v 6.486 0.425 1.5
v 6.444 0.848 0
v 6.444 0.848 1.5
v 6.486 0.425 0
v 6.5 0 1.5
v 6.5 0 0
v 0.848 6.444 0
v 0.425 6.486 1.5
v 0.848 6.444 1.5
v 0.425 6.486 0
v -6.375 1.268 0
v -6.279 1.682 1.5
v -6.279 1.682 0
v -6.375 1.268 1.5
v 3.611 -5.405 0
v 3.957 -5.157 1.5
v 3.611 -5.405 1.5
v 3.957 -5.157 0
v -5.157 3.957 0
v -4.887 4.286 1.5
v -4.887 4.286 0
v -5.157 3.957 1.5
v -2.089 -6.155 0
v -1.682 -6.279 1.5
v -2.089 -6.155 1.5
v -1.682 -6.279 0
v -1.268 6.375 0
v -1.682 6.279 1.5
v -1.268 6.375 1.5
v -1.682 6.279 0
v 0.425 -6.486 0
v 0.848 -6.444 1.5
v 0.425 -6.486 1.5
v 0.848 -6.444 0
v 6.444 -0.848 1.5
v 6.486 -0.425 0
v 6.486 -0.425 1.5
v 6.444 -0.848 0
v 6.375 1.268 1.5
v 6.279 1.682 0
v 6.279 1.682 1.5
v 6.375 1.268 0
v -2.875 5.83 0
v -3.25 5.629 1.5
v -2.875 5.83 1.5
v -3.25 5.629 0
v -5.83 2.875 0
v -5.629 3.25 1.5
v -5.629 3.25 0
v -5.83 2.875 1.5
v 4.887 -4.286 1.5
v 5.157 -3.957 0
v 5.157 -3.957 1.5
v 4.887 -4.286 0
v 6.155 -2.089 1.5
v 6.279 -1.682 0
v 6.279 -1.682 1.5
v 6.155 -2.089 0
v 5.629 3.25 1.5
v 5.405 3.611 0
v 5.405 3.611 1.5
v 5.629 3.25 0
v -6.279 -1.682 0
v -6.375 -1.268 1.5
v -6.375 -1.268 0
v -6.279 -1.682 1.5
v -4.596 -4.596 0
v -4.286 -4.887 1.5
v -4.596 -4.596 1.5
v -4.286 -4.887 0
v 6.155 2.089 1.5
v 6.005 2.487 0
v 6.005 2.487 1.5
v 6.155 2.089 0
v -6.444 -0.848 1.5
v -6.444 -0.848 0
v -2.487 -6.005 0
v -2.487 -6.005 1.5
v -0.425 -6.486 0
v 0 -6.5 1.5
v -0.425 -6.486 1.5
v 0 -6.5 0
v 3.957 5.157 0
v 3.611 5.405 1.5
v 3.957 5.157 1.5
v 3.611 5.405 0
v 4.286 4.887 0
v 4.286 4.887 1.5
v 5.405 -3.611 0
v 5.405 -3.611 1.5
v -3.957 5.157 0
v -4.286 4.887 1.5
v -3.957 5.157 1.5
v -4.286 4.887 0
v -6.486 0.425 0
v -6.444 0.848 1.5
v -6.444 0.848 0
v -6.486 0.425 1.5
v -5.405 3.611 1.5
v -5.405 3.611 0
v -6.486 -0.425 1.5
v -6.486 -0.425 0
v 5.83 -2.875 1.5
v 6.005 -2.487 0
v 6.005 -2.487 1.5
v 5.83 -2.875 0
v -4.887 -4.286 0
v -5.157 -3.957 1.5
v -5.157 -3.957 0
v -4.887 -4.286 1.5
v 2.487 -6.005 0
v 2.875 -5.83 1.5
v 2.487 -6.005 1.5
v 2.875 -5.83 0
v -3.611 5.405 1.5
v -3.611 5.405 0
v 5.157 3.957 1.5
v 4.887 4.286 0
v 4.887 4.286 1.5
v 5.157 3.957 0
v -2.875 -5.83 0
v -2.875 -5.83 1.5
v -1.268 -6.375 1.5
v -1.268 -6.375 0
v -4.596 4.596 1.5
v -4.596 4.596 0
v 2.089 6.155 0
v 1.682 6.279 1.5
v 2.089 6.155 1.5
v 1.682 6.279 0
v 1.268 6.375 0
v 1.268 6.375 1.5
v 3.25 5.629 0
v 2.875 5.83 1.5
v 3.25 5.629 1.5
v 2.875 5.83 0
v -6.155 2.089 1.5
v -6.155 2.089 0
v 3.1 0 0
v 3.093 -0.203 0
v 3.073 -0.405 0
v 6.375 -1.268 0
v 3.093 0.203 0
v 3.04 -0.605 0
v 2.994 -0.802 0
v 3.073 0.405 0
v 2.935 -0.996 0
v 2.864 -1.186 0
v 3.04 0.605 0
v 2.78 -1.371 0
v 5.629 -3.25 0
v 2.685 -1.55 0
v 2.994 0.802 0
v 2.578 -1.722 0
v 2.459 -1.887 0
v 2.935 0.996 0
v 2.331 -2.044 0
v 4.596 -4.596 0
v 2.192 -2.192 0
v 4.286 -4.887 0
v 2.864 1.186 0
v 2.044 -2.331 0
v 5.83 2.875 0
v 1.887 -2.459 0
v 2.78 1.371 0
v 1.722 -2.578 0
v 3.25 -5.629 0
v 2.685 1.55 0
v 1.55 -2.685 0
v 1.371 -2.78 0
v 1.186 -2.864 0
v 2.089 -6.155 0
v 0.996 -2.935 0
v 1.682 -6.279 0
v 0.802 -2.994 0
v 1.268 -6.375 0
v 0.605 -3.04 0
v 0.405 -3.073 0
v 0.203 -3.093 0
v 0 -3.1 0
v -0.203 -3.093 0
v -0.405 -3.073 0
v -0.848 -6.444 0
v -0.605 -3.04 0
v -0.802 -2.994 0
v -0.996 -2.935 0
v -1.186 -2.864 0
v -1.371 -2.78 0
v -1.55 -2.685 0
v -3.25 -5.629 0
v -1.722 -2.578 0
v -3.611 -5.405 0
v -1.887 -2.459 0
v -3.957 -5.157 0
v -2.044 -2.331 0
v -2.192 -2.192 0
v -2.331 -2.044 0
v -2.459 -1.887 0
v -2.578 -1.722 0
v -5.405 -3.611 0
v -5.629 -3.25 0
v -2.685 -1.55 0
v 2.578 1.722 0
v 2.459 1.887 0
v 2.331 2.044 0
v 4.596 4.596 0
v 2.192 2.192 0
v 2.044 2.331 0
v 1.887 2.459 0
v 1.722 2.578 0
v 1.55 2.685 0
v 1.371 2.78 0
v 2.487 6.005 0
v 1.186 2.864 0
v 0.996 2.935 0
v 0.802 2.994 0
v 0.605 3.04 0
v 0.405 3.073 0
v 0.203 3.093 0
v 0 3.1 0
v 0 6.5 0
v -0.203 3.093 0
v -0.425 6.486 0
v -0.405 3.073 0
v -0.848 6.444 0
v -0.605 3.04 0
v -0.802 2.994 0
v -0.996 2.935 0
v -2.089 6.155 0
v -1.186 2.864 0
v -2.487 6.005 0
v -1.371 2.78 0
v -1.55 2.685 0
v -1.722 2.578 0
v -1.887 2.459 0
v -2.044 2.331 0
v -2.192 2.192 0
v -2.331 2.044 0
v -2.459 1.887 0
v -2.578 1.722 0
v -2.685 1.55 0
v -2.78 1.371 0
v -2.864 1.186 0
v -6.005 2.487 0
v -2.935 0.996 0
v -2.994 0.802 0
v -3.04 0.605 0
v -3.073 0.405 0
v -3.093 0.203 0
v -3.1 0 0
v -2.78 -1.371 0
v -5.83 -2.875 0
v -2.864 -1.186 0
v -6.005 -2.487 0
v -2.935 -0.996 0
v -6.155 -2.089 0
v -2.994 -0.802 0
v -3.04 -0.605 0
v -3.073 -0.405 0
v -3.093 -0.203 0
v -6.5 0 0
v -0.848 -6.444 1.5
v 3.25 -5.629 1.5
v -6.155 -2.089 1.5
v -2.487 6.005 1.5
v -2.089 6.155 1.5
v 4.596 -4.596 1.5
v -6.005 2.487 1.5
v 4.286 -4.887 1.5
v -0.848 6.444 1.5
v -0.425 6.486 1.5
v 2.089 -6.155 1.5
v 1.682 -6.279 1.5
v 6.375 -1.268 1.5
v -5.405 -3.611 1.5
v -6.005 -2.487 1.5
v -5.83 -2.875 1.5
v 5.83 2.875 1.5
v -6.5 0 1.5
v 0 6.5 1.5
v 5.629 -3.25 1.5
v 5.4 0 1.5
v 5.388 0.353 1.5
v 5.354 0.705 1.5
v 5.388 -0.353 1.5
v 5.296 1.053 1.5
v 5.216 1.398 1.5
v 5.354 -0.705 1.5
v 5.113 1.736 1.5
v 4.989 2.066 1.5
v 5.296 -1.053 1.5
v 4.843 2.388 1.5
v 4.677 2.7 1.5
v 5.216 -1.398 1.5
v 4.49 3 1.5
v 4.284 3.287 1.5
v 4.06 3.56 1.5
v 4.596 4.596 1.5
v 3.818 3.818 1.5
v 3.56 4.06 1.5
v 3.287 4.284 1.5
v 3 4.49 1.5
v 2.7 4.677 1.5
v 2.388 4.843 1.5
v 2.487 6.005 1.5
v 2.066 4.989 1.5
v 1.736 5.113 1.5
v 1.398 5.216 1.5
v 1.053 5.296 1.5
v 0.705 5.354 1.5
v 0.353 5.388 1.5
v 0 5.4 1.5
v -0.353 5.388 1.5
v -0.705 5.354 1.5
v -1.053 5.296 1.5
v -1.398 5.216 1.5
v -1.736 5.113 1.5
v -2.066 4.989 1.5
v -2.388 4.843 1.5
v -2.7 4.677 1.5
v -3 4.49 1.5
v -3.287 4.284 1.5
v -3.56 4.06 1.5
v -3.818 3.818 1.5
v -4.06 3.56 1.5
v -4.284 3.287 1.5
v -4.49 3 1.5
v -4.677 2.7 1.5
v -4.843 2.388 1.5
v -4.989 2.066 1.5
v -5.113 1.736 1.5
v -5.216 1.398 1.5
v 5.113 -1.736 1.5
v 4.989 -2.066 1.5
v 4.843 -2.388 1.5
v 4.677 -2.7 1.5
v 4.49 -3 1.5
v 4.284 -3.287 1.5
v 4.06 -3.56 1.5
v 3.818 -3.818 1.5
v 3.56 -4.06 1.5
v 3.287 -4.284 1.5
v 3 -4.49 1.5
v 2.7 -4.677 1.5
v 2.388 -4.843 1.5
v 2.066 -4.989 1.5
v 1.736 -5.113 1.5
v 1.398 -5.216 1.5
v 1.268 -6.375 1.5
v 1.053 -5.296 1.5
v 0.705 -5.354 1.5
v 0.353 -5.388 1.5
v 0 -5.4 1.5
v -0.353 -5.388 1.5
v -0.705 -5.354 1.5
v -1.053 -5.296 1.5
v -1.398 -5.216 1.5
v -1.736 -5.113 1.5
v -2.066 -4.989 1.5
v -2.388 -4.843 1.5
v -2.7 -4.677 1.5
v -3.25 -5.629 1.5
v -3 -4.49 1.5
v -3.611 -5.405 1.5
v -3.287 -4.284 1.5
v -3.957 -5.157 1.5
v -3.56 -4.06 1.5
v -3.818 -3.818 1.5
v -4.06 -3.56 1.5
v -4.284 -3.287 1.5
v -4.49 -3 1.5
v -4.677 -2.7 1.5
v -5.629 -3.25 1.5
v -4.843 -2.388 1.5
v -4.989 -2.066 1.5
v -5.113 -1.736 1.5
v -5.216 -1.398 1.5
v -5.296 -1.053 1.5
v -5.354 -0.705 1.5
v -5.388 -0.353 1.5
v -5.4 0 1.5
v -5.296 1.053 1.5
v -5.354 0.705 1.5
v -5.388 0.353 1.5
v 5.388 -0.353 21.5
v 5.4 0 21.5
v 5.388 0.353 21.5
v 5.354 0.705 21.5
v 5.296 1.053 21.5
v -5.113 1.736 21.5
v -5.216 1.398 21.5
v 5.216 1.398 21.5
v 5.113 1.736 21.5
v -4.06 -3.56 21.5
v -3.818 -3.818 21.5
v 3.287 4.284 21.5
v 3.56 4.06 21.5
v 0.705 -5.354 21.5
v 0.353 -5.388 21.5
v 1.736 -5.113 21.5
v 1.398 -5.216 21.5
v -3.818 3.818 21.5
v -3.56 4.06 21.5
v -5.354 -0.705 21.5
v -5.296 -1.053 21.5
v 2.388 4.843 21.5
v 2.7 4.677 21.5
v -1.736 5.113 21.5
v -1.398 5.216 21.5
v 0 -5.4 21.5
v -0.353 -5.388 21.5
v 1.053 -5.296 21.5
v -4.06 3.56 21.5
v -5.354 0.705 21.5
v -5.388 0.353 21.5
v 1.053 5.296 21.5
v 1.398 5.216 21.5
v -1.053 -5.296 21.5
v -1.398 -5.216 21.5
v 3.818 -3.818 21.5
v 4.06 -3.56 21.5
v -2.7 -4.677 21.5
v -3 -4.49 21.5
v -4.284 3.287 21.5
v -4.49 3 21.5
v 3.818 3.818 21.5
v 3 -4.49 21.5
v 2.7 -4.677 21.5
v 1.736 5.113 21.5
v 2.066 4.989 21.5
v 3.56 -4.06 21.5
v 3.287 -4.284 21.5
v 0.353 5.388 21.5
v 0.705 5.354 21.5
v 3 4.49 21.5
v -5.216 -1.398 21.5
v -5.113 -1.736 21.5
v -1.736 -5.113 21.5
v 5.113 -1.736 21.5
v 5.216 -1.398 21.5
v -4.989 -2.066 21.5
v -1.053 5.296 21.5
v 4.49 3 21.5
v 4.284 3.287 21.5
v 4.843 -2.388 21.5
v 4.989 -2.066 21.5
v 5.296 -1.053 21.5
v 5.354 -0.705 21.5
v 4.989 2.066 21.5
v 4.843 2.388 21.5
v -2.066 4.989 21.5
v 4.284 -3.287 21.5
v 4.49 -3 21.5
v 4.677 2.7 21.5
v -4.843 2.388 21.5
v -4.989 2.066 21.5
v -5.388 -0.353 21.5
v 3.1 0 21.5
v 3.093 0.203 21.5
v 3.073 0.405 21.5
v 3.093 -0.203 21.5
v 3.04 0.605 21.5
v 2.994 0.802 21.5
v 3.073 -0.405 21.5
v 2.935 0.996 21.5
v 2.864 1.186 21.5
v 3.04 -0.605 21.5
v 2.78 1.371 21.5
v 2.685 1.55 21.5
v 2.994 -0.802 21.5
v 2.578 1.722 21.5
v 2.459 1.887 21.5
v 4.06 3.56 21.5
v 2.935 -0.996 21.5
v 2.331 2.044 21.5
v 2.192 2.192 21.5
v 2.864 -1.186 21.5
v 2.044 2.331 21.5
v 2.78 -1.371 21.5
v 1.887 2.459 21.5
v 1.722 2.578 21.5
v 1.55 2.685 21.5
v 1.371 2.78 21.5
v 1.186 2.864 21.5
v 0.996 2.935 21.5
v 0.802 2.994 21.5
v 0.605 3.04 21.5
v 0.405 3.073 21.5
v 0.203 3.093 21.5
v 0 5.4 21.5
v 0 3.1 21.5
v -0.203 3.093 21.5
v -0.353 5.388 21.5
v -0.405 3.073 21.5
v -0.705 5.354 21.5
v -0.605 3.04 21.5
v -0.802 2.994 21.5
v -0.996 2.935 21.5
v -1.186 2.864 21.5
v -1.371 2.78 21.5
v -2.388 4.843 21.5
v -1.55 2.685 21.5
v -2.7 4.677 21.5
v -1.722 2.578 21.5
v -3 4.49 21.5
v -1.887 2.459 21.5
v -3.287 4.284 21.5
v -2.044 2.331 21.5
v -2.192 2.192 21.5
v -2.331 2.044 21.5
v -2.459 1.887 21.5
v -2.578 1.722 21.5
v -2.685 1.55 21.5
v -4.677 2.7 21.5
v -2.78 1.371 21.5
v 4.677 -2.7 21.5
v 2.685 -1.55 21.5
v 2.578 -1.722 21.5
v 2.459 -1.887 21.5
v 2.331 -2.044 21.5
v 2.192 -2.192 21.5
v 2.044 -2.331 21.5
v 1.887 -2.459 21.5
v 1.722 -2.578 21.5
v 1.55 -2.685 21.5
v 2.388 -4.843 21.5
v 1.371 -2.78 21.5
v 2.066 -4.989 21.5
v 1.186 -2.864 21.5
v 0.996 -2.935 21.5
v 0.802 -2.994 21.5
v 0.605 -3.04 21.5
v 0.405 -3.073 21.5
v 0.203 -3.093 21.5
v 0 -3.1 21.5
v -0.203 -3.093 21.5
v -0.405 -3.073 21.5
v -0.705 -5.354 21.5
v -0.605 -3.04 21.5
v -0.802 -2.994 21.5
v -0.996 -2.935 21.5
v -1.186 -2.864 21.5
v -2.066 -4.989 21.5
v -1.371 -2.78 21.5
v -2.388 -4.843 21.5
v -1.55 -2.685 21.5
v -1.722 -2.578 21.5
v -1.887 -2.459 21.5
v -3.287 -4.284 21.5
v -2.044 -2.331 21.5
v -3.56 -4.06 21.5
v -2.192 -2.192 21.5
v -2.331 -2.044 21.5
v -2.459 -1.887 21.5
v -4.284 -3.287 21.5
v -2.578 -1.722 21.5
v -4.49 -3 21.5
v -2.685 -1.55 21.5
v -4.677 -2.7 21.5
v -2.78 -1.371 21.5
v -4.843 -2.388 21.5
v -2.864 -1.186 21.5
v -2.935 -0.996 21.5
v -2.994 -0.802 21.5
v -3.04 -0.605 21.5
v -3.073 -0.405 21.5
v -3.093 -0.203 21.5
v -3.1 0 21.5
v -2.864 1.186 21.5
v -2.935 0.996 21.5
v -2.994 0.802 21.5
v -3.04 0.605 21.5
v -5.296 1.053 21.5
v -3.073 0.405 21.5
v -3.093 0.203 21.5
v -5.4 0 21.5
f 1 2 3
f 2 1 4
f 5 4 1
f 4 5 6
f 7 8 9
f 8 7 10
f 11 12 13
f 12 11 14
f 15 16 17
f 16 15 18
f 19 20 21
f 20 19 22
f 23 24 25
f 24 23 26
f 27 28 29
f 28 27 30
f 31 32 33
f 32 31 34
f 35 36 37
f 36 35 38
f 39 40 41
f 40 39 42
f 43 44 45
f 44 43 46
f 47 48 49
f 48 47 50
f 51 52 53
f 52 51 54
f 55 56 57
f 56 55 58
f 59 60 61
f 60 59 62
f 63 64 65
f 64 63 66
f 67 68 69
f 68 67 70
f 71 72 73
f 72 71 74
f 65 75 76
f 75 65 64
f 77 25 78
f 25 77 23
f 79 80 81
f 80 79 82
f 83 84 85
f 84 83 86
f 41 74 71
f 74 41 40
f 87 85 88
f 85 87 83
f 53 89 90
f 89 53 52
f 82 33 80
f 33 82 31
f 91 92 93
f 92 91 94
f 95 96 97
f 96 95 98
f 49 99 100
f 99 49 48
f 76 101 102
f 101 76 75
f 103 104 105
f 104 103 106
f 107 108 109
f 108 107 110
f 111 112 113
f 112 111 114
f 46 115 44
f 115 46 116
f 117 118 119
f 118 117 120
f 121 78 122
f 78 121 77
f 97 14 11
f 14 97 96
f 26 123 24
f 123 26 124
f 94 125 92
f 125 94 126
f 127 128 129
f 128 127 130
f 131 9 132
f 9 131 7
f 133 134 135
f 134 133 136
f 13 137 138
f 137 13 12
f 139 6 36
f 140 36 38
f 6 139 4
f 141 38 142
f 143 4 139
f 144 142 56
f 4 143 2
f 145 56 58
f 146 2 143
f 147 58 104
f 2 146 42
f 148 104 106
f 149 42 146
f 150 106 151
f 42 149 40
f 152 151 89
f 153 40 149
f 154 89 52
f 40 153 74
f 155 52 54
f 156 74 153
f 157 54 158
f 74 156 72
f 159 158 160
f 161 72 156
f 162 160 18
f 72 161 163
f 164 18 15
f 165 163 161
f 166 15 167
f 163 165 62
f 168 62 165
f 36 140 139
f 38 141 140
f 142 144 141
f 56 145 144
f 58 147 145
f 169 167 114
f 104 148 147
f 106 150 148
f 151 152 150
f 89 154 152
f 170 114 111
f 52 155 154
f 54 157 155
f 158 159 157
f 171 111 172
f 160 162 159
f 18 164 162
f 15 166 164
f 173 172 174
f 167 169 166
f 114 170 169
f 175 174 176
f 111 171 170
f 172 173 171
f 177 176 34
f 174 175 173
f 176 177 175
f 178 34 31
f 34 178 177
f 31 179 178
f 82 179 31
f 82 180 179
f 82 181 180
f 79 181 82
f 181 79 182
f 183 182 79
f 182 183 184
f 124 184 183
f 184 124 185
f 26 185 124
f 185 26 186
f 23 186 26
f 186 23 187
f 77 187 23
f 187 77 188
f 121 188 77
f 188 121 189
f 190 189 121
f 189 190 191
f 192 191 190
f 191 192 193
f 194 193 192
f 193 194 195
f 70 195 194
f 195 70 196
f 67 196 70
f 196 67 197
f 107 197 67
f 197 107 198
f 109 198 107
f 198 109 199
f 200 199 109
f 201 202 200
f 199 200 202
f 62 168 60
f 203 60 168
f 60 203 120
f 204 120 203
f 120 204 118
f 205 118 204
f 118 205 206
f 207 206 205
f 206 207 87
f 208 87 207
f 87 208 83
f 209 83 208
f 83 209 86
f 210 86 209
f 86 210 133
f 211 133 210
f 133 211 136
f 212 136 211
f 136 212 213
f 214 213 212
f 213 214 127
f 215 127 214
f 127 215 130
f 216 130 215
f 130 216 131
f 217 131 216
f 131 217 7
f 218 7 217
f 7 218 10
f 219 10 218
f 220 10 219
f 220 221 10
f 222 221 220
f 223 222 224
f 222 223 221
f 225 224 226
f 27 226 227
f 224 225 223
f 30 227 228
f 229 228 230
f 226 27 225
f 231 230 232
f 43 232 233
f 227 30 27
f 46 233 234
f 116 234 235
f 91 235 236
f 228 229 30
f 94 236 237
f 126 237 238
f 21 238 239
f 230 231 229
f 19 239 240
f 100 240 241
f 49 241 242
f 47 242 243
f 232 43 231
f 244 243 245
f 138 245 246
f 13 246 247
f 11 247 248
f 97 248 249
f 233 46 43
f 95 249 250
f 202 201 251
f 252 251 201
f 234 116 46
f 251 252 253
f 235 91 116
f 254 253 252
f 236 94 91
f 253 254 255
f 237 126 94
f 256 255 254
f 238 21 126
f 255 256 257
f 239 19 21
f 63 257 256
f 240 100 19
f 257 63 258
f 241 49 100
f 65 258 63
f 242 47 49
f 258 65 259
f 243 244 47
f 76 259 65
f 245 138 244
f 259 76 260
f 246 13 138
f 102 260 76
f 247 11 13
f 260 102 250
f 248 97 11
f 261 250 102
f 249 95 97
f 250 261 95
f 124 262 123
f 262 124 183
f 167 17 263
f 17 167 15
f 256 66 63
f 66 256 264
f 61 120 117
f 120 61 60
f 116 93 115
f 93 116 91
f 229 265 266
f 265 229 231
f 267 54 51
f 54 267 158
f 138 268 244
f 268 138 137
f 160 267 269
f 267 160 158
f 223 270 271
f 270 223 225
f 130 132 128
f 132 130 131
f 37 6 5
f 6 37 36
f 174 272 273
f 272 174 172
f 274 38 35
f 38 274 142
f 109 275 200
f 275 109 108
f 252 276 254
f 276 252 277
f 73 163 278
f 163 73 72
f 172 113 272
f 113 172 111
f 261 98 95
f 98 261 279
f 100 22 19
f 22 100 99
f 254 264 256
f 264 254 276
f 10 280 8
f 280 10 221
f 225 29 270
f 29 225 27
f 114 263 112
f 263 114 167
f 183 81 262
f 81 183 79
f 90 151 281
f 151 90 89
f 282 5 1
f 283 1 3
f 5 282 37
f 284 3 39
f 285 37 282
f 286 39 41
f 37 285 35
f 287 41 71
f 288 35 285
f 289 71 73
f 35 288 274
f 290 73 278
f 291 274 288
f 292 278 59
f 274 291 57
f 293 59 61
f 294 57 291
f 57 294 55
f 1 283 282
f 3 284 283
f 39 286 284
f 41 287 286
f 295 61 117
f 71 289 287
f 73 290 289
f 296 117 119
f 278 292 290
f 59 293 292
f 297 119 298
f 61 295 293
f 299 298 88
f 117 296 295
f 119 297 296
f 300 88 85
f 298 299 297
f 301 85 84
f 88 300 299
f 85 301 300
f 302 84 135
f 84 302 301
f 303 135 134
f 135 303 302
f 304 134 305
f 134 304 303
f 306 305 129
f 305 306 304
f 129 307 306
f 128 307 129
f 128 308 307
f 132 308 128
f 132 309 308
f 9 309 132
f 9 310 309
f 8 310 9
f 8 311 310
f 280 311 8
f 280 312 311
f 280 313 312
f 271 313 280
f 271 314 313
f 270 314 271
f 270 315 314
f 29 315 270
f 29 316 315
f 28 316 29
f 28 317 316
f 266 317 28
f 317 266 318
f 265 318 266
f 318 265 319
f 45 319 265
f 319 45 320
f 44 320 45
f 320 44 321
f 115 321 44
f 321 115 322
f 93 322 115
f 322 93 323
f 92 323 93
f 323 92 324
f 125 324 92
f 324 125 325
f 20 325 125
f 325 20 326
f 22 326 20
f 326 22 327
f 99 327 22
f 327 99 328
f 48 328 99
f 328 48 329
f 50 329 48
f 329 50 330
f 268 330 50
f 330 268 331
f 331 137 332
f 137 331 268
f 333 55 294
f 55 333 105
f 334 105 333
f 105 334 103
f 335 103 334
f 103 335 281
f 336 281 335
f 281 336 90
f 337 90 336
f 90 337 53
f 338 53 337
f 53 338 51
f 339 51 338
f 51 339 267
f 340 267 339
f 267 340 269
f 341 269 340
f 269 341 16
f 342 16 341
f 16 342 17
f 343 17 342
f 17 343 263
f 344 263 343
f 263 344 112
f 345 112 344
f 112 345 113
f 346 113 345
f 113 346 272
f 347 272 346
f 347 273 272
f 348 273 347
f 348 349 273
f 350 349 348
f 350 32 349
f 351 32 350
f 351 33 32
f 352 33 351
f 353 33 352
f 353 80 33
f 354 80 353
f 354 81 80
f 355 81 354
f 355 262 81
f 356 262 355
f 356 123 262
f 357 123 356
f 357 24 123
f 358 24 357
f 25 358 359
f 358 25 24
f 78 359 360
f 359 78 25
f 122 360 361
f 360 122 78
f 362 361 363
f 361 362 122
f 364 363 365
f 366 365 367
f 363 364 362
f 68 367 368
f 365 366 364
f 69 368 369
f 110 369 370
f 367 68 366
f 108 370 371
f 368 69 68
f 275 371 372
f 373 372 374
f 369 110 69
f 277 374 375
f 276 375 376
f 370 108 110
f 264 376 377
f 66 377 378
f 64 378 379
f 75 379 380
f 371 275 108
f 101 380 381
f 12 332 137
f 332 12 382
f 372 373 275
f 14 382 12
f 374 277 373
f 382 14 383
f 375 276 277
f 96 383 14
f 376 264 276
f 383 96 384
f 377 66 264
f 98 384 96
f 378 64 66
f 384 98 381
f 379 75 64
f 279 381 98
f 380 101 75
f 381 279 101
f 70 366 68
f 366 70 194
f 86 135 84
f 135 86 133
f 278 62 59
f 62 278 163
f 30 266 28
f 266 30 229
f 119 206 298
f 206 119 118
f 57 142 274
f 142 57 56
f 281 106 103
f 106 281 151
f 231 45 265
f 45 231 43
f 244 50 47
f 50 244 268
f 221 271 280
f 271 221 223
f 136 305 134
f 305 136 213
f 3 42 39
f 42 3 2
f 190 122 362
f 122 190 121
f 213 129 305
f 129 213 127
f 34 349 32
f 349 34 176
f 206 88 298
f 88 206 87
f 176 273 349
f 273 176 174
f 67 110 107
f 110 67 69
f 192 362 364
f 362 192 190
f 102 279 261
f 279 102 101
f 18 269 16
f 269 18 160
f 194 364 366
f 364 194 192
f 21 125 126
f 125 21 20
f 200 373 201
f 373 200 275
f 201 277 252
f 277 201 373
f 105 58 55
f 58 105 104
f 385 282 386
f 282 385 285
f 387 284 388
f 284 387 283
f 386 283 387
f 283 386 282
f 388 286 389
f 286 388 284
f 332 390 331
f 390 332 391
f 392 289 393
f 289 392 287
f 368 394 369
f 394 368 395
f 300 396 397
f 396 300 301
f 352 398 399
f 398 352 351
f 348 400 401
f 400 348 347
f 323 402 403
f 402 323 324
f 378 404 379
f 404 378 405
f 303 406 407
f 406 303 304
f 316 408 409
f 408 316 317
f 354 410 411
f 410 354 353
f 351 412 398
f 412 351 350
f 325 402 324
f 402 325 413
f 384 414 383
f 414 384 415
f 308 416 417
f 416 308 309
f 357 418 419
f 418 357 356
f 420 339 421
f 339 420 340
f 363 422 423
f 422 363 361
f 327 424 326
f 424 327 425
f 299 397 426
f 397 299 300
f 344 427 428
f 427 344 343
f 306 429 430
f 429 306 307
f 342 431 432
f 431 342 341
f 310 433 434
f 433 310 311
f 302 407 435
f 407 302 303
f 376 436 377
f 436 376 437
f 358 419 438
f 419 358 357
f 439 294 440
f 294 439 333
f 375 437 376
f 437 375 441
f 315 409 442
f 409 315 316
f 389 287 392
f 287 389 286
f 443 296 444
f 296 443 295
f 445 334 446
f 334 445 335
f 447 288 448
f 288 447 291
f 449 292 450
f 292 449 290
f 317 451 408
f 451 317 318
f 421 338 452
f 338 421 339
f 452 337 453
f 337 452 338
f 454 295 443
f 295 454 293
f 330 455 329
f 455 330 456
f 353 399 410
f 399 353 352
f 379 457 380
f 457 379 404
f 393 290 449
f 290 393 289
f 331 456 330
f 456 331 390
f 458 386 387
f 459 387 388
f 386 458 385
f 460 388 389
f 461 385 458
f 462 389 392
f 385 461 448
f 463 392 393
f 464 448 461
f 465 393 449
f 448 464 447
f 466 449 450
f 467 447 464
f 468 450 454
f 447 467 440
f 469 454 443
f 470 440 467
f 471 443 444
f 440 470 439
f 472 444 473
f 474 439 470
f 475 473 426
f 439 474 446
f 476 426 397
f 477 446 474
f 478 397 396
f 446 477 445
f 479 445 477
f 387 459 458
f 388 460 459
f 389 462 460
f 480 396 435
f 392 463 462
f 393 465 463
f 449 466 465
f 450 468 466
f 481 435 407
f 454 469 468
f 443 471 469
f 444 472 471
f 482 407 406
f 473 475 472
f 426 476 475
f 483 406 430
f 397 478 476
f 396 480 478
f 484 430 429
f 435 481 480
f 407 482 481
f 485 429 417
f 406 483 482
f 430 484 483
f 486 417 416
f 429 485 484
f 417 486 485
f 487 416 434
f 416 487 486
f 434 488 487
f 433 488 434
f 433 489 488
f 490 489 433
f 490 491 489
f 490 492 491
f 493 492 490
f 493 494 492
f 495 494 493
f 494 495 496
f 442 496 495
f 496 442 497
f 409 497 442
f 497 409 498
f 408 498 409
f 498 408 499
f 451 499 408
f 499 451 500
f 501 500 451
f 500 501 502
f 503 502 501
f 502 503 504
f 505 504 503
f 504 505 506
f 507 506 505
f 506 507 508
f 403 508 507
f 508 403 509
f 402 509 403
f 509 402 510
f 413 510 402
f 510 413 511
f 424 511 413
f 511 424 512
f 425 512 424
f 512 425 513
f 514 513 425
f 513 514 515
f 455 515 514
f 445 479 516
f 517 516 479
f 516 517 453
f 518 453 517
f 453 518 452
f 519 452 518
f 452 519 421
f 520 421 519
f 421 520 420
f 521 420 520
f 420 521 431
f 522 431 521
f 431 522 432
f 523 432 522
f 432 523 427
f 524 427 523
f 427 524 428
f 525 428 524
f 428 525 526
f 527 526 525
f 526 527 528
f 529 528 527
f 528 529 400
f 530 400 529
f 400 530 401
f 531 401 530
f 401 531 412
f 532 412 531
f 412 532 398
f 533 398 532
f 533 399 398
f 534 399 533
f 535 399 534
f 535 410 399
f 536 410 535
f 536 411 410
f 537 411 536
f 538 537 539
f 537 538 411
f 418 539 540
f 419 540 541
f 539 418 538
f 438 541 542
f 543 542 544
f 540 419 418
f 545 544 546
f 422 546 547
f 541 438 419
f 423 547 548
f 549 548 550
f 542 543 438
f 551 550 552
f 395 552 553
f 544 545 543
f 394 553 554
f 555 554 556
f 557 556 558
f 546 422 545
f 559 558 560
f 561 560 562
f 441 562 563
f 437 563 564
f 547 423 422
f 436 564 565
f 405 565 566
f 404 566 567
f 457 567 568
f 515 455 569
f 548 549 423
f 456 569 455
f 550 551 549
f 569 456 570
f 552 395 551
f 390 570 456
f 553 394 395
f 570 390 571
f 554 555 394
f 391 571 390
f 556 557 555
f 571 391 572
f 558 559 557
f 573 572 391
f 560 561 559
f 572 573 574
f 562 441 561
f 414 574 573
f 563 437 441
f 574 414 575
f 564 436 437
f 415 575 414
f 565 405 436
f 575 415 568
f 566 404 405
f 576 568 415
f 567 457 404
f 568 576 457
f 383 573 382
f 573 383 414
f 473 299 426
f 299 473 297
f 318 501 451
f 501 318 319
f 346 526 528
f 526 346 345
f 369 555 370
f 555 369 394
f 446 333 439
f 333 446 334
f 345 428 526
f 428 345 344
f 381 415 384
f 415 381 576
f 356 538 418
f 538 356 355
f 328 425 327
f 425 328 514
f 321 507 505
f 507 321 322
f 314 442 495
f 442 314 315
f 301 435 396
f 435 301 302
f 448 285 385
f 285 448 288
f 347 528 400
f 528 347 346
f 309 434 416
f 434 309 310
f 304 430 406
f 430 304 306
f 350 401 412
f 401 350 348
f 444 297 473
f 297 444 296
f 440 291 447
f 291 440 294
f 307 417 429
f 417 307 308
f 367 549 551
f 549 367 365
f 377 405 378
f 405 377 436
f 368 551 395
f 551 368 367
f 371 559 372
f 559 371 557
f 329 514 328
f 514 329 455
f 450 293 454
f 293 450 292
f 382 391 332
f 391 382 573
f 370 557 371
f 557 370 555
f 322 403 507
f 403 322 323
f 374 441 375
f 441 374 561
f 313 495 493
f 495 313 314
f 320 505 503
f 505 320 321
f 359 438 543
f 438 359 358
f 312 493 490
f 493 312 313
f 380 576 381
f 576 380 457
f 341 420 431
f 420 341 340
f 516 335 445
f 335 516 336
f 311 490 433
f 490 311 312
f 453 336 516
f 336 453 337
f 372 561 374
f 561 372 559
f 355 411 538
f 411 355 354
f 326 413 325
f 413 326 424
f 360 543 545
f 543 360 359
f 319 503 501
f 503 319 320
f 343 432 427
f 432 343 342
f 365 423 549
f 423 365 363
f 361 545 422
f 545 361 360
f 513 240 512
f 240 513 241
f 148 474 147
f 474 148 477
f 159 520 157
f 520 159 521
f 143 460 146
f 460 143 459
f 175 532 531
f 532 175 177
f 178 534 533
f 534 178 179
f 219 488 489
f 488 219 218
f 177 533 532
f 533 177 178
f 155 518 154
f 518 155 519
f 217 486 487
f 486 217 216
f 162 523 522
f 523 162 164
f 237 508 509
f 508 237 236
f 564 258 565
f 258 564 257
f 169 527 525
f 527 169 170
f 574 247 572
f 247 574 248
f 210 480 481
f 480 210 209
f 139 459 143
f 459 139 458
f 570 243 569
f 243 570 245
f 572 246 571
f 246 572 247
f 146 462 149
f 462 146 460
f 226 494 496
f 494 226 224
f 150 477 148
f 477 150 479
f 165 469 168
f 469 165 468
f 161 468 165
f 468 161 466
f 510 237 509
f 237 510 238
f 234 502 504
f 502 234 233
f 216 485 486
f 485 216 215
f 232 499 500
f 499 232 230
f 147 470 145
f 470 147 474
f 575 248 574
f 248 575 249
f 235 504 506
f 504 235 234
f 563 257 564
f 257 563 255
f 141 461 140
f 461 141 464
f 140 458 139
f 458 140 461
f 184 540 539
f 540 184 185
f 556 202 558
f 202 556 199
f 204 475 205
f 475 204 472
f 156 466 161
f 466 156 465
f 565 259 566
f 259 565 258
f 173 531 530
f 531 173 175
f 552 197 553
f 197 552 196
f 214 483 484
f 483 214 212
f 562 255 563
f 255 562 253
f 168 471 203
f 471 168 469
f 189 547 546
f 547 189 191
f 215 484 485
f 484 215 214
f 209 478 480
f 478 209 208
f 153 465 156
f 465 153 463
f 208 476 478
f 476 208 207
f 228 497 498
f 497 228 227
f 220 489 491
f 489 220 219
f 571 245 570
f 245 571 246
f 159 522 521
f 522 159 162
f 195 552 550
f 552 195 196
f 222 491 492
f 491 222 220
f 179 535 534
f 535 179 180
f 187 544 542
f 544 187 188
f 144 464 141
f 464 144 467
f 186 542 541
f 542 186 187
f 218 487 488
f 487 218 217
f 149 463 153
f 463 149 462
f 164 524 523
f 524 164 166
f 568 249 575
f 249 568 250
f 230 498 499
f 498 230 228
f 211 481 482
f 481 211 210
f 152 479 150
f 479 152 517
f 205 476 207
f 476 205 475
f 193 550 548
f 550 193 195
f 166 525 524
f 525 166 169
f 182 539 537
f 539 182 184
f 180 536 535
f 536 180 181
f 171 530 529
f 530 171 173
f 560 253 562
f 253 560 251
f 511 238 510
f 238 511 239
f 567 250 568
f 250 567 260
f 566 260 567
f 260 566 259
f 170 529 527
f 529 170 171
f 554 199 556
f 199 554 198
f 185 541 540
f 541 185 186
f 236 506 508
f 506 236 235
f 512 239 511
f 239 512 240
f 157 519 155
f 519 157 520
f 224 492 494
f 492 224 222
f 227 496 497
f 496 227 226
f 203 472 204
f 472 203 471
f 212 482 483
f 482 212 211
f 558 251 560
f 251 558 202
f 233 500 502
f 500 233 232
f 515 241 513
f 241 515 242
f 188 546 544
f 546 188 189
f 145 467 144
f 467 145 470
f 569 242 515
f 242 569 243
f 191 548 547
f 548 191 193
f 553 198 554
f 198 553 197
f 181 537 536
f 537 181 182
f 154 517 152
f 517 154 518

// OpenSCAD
// PCR tube adapter sleeve: 0.2 mL tube in a 1.5 mL rack hole
// Print orientation: collar on bed (z = 0), sleeve body rises to z = 21.5

// ---- Dimensions (mm) ----
collar_d        = 13;    // collar outer diameter
collar_h        = 1.5;   // collar thickness (z = 0 to 1.5)
sleeve_od       = 10.8;  // sleeve body outer diameter
sleeve_top_z    = 21.5;  // top of sleeve body
bore_d          = 6.2;   // through-bore diameter
eps             = 0.5;   // cutter overshoot past faces

$fn = 96;

difference() {
    union() {
        // Collar
        cylinder(d = collar_d, h = collar_h);
        // Sleeve body (slightly overlapping collar for a clean union)
        translate([0, 0, collar_h - 0.01])
            cylinder(d = sleeve_od, h = sleeve_top_z - collar_h + 0.01);
    }
    // Through bore
    translate([0, 0, -eps])
        cylinder(d = bore_d, h = sleeve_top_z + 2 * eps);
}
